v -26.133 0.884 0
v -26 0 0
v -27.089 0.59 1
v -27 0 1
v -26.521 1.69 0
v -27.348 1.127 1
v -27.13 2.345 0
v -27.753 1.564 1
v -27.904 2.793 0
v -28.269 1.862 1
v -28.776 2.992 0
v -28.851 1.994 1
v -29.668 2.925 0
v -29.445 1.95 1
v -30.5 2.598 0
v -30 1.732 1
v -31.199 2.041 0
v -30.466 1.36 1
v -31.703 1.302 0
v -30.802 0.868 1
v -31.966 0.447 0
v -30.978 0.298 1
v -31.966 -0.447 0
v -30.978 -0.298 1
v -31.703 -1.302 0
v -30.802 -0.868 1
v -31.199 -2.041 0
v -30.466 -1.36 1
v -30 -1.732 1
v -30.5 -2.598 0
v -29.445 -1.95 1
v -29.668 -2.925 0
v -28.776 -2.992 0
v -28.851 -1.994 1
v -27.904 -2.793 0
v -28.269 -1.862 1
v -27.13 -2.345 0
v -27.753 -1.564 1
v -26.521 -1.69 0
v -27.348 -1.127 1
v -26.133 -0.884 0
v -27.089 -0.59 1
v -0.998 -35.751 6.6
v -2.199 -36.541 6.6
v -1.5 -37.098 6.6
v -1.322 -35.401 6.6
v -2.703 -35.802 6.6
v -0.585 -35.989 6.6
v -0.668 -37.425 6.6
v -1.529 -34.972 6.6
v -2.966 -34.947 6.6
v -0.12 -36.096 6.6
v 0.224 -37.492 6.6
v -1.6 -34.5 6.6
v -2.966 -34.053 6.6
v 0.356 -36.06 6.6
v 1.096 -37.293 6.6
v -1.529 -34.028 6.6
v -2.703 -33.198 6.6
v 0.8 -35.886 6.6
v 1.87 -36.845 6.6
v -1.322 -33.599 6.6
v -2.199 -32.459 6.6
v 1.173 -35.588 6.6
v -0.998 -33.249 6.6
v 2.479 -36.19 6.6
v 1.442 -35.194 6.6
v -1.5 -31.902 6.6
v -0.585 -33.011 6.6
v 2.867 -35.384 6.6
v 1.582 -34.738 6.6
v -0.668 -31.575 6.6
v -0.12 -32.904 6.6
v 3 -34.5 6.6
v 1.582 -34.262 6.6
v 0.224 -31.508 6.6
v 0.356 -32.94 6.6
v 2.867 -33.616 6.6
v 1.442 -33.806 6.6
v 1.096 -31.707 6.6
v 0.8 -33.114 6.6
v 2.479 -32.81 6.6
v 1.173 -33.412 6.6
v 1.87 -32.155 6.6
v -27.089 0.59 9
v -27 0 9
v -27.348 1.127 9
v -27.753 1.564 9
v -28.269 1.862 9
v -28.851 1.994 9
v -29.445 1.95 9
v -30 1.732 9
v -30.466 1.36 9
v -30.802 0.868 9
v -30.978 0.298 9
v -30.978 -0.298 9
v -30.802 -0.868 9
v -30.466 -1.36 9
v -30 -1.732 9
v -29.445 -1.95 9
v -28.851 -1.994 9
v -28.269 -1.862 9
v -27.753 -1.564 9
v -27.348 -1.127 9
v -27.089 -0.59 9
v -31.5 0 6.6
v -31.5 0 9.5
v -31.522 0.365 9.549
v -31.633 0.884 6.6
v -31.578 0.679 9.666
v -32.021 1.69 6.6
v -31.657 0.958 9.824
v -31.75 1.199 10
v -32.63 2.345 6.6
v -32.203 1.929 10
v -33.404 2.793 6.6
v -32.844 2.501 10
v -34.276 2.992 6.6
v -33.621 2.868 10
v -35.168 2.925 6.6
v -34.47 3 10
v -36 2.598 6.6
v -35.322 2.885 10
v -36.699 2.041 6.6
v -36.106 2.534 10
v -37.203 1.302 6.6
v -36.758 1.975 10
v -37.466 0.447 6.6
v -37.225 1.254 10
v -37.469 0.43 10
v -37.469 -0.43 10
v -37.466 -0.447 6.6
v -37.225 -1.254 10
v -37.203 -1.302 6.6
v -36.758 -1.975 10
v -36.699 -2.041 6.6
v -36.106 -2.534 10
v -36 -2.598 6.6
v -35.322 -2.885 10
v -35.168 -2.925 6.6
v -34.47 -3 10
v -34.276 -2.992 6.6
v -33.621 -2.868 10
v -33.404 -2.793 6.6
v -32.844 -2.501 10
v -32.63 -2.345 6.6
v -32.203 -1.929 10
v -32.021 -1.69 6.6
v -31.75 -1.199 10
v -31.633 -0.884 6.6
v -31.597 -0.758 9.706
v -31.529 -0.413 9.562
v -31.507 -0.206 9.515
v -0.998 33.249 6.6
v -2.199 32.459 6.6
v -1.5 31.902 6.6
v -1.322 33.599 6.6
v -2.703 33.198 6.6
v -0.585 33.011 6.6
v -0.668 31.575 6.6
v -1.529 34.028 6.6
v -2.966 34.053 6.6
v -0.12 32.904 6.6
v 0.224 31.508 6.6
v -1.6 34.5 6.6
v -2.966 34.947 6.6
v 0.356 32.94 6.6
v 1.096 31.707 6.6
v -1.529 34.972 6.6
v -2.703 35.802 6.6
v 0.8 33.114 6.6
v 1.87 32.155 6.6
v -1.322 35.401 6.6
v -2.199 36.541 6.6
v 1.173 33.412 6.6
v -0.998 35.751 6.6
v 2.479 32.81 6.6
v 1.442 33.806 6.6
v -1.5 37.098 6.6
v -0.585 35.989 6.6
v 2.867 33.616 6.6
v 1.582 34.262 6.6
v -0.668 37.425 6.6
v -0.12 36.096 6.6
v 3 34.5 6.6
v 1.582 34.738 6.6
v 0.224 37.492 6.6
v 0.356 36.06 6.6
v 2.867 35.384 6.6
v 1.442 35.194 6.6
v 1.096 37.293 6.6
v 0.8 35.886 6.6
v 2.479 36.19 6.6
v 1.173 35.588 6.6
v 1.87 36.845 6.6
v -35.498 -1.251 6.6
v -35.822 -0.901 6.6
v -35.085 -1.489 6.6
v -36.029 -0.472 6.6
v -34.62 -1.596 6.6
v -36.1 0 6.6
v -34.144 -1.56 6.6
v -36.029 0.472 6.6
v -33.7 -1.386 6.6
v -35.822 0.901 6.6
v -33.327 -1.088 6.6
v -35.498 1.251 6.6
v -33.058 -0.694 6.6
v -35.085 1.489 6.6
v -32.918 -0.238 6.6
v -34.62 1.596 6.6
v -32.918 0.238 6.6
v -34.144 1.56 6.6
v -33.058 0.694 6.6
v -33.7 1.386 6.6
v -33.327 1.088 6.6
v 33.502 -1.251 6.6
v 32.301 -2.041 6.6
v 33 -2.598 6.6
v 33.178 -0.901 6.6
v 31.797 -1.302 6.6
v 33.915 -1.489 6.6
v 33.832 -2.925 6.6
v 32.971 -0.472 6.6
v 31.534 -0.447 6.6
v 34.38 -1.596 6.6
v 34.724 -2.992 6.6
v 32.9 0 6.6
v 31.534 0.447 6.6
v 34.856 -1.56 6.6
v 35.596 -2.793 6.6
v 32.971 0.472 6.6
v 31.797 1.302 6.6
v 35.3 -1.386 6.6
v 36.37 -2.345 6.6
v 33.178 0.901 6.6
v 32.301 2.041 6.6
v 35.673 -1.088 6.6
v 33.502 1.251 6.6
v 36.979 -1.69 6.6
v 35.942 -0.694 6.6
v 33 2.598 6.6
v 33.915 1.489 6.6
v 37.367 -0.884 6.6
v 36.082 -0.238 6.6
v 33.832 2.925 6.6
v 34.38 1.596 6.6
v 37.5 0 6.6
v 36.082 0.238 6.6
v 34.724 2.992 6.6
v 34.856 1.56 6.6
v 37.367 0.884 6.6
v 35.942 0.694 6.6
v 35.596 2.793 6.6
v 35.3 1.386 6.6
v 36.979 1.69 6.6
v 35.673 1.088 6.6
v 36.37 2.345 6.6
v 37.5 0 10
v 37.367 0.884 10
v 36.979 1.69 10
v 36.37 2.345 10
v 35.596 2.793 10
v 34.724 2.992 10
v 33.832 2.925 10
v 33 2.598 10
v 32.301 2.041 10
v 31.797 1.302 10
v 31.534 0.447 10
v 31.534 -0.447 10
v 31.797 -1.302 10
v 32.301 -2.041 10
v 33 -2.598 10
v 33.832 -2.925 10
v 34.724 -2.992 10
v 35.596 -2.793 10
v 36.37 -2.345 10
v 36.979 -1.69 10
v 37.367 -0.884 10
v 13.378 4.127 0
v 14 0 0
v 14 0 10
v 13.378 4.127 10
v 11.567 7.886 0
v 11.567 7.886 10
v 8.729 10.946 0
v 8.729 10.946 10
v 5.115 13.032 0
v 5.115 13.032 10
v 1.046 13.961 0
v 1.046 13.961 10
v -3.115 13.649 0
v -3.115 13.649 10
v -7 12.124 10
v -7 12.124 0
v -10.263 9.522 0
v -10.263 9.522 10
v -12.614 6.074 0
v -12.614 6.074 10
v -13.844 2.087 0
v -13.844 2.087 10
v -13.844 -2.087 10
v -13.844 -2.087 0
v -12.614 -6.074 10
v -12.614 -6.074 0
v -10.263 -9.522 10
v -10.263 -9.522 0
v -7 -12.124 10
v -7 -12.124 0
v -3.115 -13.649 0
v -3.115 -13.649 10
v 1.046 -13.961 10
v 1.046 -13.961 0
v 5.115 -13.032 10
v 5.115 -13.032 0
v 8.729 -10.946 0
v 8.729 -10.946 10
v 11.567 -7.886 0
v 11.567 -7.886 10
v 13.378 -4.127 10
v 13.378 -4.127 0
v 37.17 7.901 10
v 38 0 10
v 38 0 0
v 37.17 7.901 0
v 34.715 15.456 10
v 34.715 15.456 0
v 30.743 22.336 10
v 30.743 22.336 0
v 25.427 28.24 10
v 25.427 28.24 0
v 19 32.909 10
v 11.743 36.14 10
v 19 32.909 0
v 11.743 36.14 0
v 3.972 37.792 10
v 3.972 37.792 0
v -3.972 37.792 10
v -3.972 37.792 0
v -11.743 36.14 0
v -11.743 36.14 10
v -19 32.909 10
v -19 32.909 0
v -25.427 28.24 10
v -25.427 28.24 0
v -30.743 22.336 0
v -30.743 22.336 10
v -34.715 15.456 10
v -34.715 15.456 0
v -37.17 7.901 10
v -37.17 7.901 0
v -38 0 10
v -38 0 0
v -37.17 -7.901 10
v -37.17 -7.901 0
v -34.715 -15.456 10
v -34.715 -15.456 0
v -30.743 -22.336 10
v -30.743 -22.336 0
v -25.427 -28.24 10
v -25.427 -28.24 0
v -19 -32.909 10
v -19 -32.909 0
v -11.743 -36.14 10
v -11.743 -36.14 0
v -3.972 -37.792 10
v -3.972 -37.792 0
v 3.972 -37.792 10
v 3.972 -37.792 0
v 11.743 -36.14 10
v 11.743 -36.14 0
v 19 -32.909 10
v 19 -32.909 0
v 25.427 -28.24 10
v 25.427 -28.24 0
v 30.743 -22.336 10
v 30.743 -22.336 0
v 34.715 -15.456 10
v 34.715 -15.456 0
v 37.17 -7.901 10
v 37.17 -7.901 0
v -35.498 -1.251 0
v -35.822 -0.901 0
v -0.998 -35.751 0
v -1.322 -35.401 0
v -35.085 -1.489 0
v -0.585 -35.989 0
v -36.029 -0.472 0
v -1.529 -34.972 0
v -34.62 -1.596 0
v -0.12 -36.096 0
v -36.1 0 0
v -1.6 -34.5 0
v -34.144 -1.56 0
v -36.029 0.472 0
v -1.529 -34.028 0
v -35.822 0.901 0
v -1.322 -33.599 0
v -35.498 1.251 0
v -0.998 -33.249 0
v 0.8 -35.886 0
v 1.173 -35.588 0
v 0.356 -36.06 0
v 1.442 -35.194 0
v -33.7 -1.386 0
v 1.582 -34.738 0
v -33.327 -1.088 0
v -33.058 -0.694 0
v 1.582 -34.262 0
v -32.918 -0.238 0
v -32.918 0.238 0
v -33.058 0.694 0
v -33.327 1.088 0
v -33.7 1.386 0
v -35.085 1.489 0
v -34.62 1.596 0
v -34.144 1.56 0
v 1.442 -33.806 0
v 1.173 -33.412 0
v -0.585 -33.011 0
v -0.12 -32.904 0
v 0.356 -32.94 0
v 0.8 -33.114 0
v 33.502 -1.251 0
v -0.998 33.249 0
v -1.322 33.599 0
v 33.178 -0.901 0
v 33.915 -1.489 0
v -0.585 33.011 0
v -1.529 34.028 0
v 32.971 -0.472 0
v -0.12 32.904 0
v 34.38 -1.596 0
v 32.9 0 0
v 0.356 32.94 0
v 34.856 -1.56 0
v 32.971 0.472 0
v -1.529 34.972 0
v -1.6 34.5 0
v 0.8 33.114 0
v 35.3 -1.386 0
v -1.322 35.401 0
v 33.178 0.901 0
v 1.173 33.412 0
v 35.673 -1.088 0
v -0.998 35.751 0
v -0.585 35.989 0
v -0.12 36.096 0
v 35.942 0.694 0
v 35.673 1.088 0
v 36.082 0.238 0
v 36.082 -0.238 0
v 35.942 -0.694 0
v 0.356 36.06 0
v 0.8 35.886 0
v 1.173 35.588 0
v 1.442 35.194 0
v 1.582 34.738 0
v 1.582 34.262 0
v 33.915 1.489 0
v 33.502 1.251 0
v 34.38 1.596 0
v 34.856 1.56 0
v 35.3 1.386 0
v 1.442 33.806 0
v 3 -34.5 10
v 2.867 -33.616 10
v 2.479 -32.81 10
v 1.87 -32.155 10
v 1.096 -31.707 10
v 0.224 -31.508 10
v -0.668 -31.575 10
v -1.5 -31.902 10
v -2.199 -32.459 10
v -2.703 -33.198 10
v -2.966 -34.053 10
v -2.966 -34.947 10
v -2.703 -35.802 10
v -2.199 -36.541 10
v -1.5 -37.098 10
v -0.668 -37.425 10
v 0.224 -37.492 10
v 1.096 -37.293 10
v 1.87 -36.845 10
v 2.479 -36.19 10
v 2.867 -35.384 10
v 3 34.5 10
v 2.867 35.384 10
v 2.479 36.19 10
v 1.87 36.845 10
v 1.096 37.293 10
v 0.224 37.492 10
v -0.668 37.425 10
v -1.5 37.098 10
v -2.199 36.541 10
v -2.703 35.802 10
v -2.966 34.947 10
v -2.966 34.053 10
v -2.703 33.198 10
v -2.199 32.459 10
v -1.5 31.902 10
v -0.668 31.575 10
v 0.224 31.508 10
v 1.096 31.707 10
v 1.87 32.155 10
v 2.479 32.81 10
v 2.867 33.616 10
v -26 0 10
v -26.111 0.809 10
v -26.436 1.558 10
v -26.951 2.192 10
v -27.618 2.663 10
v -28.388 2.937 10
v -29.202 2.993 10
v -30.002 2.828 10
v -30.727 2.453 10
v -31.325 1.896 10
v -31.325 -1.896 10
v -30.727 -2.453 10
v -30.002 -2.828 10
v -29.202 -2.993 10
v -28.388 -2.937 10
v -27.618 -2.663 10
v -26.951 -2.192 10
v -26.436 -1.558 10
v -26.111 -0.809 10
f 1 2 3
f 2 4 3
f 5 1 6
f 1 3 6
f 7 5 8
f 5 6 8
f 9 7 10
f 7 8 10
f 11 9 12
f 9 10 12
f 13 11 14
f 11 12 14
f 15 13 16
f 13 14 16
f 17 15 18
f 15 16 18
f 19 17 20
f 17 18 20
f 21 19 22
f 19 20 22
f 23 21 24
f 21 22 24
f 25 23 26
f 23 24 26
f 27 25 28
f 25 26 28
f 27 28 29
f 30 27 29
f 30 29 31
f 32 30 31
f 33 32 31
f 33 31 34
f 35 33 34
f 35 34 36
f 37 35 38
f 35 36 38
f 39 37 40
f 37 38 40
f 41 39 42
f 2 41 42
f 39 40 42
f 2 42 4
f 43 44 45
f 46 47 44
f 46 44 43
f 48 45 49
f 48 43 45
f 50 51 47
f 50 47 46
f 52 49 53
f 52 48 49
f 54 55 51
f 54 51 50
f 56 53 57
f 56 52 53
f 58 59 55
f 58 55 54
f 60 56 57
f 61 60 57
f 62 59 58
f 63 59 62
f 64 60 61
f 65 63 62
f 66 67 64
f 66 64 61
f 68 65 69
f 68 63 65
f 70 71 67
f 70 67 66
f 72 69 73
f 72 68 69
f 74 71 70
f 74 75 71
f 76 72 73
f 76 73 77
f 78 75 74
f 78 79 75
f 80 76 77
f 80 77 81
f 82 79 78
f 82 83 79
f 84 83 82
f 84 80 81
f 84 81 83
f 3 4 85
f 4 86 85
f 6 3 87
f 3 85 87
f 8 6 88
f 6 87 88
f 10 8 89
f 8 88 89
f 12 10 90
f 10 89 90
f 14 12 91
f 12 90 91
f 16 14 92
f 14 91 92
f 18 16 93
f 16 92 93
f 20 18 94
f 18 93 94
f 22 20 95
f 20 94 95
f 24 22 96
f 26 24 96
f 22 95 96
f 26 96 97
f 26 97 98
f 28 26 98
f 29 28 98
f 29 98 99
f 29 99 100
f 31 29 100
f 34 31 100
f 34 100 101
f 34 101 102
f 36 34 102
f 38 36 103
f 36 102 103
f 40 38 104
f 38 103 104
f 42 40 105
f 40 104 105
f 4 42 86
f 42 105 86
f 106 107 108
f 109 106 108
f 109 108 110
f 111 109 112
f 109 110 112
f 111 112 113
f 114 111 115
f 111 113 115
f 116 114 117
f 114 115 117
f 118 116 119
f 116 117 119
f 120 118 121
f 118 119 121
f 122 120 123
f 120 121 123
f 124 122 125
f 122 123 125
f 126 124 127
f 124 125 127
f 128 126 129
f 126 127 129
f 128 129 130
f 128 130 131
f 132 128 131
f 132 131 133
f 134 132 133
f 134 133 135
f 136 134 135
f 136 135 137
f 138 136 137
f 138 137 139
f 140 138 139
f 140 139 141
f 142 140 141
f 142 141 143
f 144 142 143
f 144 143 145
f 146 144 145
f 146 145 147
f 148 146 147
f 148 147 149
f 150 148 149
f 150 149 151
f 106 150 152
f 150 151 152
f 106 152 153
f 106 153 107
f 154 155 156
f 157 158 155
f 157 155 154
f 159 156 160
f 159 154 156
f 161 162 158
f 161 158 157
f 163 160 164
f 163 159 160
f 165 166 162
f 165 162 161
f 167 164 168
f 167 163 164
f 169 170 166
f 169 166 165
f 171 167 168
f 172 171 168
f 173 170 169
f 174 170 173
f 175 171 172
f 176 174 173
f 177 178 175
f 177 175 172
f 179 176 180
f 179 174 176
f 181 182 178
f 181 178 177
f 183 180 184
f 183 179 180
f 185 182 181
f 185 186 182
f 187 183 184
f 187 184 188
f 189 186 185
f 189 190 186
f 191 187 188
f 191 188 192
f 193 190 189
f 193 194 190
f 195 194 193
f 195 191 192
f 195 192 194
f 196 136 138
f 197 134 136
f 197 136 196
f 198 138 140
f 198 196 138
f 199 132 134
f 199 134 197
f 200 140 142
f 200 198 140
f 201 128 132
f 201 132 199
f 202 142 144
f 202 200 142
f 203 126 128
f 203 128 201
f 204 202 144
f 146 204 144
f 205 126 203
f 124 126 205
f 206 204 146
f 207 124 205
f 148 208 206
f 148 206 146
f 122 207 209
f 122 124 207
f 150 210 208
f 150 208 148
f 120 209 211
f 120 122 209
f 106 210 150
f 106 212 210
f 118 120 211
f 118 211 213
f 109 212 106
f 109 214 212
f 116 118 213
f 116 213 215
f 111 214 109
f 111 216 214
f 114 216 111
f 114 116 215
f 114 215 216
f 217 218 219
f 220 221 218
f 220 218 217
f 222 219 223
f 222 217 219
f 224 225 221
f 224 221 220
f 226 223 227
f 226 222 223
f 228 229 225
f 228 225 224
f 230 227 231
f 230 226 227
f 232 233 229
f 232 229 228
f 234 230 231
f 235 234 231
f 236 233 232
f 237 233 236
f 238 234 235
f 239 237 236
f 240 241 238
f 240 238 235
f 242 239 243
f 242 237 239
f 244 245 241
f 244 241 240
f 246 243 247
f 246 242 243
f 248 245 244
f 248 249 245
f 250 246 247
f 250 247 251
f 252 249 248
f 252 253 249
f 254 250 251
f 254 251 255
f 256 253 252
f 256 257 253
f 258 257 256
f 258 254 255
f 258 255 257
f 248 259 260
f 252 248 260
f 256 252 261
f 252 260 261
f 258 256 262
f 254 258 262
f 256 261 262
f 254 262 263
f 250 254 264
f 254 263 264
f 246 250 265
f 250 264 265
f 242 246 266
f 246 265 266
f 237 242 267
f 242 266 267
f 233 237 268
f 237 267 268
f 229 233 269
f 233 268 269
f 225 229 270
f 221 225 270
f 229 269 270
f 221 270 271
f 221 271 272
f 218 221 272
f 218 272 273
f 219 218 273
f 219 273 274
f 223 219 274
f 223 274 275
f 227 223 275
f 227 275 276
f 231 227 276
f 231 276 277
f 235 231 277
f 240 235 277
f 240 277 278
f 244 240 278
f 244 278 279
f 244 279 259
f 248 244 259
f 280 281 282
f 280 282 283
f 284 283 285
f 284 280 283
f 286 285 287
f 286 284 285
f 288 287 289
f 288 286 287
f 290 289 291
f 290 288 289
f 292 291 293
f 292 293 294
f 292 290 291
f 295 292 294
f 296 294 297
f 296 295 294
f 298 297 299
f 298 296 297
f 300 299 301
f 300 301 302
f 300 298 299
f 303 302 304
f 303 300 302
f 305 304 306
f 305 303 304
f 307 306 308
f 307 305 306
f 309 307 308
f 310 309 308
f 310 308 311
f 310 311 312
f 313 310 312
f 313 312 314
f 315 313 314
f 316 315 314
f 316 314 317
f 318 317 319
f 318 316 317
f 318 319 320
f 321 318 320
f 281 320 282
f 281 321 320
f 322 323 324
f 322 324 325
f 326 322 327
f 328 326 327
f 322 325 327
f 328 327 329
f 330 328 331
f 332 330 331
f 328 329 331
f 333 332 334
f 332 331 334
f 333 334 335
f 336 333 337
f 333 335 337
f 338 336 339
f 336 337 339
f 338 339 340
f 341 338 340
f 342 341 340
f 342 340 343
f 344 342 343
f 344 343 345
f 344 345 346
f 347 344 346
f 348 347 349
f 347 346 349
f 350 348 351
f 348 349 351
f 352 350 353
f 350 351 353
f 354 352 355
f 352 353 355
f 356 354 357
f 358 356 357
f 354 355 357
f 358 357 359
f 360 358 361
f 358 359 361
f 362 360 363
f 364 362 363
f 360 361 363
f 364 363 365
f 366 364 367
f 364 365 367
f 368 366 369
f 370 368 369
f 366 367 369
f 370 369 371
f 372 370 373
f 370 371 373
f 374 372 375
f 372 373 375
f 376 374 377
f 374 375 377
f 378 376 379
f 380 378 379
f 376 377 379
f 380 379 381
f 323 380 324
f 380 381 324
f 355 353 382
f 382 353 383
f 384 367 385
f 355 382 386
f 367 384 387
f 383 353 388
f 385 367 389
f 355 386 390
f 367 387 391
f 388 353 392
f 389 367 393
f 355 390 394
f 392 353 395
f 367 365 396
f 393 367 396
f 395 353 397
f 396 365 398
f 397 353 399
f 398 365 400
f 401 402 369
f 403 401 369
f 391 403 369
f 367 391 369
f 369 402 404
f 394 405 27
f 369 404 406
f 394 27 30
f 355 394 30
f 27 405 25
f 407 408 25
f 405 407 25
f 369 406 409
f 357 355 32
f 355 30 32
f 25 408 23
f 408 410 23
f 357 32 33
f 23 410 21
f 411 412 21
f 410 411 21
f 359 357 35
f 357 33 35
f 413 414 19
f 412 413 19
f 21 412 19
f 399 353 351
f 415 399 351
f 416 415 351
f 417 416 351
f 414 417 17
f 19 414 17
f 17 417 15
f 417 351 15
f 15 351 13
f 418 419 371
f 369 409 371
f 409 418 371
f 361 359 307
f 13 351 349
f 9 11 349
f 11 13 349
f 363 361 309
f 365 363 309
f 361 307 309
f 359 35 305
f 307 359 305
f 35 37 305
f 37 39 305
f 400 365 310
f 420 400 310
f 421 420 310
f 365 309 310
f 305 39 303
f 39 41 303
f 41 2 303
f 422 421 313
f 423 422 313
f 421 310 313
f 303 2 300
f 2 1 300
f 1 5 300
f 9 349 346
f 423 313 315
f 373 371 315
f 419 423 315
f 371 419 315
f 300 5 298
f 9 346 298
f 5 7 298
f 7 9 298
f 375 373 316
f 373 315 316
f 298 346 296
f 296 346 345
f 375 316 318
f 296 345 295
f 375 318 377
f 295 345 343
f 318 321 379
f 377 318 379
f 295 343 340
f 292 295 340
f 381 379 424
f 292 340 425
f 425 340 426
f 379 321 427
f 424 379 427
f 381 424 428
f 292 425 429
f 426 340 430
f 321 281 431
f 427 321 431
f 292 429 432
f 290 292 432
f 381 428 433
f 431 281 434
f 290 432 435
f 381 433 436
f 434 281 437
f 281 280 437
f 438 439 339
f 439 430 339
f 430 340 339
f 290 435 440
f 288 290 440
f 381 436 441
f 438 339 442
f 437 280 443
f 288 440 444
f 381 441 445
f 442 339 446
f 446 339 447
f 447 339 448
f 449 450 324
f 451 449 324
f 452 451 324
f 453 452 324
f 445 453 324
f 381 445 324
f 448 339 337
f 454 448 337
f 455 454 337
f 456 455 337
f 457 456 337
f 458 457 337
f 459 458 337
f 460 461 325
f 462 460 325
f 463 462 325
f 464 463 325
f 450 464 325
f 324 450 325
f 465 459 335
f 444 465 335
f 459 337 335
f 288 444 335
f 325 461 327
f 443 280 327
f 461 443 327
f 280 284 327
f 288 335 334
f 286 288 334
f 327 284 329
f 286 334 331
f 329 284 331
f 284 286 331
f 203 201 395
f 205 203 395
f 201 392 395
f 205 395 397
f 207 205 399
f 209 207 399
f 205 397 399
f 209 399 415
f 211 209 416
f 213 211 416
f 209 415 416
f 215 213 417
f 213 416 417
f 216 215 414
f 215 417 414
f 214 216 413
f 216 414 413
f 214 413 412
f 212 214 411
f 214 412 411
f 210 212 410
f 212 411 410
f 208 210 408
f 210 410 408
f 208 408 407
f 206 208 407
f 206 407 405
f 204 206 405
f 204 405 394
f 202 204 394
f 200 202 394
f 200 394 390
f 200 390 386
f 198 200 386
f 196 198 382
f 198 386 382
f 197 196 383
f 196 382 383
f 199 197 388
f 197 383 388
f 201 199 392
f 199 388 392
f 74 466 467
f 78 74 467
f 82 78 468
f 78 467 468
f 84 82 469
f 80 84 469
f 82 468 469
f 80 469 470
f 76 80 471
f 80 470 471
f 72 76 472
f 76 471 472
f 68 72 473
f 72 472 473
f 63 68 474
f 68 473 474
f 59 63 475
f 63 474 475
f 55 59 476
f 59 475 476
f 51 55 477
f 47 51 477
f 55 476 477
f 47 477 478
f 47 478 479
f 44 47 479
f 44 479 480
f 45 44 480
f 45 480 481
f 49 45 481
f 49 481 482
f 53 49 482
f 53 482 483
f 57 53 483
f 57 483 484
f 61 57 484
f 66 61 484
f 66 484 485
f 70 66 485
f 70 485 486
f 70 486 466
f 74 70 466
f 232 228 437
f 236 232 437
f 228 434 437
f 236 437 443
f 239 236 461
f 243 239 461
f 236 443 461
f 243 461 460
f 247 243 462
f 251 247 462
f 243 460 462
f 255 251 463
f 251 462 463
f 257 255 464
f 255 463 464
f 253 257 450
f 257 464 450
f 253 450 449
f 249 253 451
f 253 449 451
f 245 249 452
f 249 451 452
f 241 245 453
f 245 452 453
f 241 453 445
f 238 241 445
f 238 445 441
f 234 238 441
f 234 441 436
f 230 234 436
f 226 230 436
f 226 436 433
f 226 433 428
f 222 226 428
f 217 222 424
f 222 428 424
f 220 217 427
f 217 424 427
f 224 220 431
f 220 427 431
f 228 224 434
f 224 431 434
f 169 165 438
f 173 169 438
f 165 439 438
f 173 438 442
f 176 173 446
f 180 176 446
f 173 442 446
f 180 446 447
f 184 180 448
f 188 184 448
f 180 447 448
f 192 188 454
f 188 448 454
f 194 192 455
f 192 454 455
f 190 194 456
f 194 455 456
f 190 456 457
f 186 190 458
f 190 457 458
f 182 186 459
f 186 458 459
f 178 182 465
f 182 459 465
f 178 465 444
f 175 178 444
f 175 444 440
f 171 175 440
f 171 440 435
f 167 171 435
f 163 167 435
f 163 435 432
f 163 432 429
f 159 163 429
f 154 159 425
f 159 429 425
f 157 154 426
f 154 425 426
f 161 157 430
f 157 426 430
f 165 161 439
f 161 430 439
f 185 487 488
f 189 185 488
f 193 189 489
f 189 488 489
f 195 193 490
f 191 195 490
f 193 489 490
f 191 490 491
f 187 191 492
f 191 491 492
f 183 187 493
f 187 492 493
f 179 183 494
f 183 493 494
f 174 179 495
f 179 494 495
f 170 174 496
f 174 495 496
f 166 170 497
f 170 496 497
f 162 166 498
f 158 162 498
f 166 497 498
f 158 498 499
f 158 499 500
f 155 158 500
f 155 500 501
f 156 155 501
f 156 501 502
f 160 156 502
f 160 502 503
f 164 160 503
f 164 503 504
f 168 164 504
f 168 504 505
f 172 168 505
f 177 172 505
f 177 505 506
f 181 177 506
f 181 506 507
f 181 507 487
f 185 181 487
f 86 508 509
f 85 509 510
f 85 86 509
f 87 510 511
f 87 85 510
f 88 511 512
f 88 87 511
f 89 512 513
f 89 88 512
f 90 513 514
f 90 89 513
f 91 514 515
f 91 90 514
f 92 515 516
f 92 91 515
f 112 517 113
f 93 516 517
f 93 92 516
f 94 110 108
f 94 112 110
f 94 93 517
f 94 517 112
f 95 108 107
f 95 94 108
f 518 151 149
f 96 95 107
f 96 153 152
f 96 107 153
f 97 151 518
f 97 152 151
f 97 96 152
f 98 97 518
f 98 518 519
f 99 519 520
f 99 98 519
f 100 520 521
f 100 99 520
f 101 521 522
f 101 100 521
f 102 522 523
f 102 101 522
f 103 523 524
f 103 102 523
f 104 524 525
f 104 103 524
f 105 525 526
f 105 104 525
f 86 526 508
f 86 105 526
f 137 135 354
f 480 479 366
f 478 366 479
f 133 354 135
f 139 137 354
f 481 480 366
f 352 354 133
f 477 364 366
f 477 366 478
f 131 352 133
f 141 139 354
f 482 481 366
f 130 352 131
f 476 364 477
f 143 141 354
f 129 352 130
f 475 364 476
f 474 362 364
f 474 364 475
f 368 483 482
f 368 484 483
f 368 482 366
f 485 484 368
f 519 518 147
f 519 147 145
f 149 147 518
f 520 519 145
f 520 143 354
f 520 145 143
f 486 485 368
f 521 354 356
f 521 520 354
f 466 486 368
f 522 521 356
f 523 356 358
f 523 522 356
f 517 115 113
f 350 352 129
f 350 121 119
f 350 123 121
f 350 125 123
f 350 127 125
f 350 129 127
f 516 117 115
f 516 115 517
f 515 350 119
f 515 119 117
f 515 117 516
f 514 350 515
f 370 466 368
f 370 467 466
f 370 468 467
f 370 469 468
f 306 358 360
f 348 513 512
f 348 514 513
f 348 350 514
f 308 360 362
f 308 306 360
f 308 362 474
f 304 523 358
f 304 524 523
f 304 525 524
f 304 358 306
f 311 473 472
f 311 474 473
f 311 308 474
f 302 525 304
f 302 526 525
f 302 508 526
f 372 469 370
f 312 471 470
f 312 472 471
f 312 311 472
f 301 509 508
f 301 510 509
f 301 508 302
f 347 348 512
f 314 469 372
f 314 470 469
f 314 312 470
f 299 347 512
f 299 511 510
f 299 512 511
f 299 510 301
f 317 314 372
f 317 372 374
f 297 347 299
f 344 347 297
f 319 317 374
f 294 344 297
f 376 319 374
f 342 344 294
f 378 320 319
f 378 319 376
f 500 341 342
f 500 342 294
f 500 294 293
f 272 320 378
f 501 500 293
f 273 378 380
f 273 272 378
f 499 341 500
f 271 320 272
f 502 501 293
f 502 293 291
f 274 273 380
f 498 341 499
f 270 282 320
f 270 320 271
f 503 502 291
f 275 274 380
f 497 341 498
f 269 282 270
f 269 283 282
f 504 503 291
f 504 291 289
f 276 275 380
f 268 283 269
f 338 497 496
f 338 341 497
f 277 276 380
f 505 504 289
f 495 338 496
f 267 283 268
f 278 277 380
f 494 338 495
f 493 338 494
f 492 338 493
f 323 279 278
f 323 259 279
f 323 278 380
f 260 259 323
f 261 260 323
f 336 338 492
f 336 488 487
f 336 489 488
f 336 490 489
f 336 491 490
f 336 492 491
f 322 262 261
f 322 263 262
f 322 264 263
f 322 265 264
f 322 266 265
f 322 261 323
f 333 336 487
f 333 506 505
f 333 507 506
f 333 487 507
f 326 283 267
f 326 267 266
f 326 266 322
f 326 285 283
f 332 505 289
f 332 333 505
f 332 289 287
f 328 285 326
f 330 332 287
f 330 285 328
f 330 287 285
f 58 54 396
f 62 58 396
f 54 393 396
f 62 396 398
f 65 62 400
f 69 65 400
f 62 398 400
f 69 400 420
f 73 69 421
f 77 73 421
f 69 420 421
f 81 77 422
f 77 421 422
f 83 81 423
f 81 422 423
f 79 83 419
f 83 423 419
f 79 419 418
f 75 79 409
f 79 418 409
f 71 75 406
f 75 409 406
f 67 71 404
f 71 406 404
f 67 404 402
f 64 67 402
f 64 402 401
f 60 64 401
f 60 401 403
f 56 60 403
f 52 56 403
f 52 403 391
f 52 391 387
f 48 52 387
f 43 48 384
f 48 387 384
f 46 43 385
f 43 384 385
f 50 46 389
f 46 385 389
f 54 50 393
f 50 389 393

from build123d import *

# Parameters (mm, degrees)
SKETCH_1_R                = 38
SKETCH_1_R_2              = 14
EXTRUDE_1_DEPTH           = 10
HOLE_WIZARD_1_D           = 3.2
HOLE_WIZARD_1_CBORE_D     = 6
HOLE_WIZARD_1_CBORE_DEPTH = 3.4
HOLE_WIZARD_4_0_4_1_D     = 4
CHAMFER_1_SIZE            = 1


with BuildPart() as part:
    # 草图1 → 凸台-拉伸1 (new body)
    with BuildSketch(Plane.XY):
        Circle(SKETCH_1_R)
        Circle(SKETCH_1_R_2, mode=Mode.SUBTRACT)
    extrude(amount=EXTRUDE_1_DEPTH)

    # 打孔尺寸(%根据)内六角圆柱头螺钉的类型1 (through all)
    with Locations(Plane.XY.offset(10)):
        with Locations((0, 34.5), (34.5, 0), (0, -34.5), (-34.5, 0)):
            CounterBoreHole(HOLE_WIZARD_1_D / 2, HOLE_WIZARD_1_CBORE_D / 2, HOLE_WIZARD_1_CBORE_DEPTH)

    # Ø4.0 (4) 直径孔1 (through all)
    with Locations(Plane(origin=(0, 0, 0), x_dir=(-1, 0, 0), z_dir=(0, 0, -1))):
        with Locations((29, 0)):
            Hole(HOLE_WIZARD_4_0_4_1_D / 2)

    # 倒角1
    # the kernel refuses this chamfer: 1 mm, written as the material it takes off along each edge
    with BuildSketch(Plane(origin=(-29, 0, 0), x_dir=(1, 0, 0), z_dir=(0, -1, 0))) as chamfer_1_piece_1:
        Polygon((2 + CHAMFER_1_SIZE, 0), (2, CHAMFER_1_SIZE), (2, 0), align=None)
    revolve(axis=Axis((-29, 0, 0), (0, 0, 1)), mode=Mode.SUBTRACT)
    with BuildSketch(Plane(origin=(-29, 0, 10), x_dir=(1, 0, 0), z_dir=(0, -1, 0))) as chamfer_1_piece_2:
        Polygon((2 + CHAMFER_1_SIZE, 0), (2, -CHAMFER_1_SIZE), (2, 0), align=None)
    revolve(axis=Axis((-29, 0, 10), (0, 0, 1)), mode=Mode.SUBTRACT)


solid = part.part
